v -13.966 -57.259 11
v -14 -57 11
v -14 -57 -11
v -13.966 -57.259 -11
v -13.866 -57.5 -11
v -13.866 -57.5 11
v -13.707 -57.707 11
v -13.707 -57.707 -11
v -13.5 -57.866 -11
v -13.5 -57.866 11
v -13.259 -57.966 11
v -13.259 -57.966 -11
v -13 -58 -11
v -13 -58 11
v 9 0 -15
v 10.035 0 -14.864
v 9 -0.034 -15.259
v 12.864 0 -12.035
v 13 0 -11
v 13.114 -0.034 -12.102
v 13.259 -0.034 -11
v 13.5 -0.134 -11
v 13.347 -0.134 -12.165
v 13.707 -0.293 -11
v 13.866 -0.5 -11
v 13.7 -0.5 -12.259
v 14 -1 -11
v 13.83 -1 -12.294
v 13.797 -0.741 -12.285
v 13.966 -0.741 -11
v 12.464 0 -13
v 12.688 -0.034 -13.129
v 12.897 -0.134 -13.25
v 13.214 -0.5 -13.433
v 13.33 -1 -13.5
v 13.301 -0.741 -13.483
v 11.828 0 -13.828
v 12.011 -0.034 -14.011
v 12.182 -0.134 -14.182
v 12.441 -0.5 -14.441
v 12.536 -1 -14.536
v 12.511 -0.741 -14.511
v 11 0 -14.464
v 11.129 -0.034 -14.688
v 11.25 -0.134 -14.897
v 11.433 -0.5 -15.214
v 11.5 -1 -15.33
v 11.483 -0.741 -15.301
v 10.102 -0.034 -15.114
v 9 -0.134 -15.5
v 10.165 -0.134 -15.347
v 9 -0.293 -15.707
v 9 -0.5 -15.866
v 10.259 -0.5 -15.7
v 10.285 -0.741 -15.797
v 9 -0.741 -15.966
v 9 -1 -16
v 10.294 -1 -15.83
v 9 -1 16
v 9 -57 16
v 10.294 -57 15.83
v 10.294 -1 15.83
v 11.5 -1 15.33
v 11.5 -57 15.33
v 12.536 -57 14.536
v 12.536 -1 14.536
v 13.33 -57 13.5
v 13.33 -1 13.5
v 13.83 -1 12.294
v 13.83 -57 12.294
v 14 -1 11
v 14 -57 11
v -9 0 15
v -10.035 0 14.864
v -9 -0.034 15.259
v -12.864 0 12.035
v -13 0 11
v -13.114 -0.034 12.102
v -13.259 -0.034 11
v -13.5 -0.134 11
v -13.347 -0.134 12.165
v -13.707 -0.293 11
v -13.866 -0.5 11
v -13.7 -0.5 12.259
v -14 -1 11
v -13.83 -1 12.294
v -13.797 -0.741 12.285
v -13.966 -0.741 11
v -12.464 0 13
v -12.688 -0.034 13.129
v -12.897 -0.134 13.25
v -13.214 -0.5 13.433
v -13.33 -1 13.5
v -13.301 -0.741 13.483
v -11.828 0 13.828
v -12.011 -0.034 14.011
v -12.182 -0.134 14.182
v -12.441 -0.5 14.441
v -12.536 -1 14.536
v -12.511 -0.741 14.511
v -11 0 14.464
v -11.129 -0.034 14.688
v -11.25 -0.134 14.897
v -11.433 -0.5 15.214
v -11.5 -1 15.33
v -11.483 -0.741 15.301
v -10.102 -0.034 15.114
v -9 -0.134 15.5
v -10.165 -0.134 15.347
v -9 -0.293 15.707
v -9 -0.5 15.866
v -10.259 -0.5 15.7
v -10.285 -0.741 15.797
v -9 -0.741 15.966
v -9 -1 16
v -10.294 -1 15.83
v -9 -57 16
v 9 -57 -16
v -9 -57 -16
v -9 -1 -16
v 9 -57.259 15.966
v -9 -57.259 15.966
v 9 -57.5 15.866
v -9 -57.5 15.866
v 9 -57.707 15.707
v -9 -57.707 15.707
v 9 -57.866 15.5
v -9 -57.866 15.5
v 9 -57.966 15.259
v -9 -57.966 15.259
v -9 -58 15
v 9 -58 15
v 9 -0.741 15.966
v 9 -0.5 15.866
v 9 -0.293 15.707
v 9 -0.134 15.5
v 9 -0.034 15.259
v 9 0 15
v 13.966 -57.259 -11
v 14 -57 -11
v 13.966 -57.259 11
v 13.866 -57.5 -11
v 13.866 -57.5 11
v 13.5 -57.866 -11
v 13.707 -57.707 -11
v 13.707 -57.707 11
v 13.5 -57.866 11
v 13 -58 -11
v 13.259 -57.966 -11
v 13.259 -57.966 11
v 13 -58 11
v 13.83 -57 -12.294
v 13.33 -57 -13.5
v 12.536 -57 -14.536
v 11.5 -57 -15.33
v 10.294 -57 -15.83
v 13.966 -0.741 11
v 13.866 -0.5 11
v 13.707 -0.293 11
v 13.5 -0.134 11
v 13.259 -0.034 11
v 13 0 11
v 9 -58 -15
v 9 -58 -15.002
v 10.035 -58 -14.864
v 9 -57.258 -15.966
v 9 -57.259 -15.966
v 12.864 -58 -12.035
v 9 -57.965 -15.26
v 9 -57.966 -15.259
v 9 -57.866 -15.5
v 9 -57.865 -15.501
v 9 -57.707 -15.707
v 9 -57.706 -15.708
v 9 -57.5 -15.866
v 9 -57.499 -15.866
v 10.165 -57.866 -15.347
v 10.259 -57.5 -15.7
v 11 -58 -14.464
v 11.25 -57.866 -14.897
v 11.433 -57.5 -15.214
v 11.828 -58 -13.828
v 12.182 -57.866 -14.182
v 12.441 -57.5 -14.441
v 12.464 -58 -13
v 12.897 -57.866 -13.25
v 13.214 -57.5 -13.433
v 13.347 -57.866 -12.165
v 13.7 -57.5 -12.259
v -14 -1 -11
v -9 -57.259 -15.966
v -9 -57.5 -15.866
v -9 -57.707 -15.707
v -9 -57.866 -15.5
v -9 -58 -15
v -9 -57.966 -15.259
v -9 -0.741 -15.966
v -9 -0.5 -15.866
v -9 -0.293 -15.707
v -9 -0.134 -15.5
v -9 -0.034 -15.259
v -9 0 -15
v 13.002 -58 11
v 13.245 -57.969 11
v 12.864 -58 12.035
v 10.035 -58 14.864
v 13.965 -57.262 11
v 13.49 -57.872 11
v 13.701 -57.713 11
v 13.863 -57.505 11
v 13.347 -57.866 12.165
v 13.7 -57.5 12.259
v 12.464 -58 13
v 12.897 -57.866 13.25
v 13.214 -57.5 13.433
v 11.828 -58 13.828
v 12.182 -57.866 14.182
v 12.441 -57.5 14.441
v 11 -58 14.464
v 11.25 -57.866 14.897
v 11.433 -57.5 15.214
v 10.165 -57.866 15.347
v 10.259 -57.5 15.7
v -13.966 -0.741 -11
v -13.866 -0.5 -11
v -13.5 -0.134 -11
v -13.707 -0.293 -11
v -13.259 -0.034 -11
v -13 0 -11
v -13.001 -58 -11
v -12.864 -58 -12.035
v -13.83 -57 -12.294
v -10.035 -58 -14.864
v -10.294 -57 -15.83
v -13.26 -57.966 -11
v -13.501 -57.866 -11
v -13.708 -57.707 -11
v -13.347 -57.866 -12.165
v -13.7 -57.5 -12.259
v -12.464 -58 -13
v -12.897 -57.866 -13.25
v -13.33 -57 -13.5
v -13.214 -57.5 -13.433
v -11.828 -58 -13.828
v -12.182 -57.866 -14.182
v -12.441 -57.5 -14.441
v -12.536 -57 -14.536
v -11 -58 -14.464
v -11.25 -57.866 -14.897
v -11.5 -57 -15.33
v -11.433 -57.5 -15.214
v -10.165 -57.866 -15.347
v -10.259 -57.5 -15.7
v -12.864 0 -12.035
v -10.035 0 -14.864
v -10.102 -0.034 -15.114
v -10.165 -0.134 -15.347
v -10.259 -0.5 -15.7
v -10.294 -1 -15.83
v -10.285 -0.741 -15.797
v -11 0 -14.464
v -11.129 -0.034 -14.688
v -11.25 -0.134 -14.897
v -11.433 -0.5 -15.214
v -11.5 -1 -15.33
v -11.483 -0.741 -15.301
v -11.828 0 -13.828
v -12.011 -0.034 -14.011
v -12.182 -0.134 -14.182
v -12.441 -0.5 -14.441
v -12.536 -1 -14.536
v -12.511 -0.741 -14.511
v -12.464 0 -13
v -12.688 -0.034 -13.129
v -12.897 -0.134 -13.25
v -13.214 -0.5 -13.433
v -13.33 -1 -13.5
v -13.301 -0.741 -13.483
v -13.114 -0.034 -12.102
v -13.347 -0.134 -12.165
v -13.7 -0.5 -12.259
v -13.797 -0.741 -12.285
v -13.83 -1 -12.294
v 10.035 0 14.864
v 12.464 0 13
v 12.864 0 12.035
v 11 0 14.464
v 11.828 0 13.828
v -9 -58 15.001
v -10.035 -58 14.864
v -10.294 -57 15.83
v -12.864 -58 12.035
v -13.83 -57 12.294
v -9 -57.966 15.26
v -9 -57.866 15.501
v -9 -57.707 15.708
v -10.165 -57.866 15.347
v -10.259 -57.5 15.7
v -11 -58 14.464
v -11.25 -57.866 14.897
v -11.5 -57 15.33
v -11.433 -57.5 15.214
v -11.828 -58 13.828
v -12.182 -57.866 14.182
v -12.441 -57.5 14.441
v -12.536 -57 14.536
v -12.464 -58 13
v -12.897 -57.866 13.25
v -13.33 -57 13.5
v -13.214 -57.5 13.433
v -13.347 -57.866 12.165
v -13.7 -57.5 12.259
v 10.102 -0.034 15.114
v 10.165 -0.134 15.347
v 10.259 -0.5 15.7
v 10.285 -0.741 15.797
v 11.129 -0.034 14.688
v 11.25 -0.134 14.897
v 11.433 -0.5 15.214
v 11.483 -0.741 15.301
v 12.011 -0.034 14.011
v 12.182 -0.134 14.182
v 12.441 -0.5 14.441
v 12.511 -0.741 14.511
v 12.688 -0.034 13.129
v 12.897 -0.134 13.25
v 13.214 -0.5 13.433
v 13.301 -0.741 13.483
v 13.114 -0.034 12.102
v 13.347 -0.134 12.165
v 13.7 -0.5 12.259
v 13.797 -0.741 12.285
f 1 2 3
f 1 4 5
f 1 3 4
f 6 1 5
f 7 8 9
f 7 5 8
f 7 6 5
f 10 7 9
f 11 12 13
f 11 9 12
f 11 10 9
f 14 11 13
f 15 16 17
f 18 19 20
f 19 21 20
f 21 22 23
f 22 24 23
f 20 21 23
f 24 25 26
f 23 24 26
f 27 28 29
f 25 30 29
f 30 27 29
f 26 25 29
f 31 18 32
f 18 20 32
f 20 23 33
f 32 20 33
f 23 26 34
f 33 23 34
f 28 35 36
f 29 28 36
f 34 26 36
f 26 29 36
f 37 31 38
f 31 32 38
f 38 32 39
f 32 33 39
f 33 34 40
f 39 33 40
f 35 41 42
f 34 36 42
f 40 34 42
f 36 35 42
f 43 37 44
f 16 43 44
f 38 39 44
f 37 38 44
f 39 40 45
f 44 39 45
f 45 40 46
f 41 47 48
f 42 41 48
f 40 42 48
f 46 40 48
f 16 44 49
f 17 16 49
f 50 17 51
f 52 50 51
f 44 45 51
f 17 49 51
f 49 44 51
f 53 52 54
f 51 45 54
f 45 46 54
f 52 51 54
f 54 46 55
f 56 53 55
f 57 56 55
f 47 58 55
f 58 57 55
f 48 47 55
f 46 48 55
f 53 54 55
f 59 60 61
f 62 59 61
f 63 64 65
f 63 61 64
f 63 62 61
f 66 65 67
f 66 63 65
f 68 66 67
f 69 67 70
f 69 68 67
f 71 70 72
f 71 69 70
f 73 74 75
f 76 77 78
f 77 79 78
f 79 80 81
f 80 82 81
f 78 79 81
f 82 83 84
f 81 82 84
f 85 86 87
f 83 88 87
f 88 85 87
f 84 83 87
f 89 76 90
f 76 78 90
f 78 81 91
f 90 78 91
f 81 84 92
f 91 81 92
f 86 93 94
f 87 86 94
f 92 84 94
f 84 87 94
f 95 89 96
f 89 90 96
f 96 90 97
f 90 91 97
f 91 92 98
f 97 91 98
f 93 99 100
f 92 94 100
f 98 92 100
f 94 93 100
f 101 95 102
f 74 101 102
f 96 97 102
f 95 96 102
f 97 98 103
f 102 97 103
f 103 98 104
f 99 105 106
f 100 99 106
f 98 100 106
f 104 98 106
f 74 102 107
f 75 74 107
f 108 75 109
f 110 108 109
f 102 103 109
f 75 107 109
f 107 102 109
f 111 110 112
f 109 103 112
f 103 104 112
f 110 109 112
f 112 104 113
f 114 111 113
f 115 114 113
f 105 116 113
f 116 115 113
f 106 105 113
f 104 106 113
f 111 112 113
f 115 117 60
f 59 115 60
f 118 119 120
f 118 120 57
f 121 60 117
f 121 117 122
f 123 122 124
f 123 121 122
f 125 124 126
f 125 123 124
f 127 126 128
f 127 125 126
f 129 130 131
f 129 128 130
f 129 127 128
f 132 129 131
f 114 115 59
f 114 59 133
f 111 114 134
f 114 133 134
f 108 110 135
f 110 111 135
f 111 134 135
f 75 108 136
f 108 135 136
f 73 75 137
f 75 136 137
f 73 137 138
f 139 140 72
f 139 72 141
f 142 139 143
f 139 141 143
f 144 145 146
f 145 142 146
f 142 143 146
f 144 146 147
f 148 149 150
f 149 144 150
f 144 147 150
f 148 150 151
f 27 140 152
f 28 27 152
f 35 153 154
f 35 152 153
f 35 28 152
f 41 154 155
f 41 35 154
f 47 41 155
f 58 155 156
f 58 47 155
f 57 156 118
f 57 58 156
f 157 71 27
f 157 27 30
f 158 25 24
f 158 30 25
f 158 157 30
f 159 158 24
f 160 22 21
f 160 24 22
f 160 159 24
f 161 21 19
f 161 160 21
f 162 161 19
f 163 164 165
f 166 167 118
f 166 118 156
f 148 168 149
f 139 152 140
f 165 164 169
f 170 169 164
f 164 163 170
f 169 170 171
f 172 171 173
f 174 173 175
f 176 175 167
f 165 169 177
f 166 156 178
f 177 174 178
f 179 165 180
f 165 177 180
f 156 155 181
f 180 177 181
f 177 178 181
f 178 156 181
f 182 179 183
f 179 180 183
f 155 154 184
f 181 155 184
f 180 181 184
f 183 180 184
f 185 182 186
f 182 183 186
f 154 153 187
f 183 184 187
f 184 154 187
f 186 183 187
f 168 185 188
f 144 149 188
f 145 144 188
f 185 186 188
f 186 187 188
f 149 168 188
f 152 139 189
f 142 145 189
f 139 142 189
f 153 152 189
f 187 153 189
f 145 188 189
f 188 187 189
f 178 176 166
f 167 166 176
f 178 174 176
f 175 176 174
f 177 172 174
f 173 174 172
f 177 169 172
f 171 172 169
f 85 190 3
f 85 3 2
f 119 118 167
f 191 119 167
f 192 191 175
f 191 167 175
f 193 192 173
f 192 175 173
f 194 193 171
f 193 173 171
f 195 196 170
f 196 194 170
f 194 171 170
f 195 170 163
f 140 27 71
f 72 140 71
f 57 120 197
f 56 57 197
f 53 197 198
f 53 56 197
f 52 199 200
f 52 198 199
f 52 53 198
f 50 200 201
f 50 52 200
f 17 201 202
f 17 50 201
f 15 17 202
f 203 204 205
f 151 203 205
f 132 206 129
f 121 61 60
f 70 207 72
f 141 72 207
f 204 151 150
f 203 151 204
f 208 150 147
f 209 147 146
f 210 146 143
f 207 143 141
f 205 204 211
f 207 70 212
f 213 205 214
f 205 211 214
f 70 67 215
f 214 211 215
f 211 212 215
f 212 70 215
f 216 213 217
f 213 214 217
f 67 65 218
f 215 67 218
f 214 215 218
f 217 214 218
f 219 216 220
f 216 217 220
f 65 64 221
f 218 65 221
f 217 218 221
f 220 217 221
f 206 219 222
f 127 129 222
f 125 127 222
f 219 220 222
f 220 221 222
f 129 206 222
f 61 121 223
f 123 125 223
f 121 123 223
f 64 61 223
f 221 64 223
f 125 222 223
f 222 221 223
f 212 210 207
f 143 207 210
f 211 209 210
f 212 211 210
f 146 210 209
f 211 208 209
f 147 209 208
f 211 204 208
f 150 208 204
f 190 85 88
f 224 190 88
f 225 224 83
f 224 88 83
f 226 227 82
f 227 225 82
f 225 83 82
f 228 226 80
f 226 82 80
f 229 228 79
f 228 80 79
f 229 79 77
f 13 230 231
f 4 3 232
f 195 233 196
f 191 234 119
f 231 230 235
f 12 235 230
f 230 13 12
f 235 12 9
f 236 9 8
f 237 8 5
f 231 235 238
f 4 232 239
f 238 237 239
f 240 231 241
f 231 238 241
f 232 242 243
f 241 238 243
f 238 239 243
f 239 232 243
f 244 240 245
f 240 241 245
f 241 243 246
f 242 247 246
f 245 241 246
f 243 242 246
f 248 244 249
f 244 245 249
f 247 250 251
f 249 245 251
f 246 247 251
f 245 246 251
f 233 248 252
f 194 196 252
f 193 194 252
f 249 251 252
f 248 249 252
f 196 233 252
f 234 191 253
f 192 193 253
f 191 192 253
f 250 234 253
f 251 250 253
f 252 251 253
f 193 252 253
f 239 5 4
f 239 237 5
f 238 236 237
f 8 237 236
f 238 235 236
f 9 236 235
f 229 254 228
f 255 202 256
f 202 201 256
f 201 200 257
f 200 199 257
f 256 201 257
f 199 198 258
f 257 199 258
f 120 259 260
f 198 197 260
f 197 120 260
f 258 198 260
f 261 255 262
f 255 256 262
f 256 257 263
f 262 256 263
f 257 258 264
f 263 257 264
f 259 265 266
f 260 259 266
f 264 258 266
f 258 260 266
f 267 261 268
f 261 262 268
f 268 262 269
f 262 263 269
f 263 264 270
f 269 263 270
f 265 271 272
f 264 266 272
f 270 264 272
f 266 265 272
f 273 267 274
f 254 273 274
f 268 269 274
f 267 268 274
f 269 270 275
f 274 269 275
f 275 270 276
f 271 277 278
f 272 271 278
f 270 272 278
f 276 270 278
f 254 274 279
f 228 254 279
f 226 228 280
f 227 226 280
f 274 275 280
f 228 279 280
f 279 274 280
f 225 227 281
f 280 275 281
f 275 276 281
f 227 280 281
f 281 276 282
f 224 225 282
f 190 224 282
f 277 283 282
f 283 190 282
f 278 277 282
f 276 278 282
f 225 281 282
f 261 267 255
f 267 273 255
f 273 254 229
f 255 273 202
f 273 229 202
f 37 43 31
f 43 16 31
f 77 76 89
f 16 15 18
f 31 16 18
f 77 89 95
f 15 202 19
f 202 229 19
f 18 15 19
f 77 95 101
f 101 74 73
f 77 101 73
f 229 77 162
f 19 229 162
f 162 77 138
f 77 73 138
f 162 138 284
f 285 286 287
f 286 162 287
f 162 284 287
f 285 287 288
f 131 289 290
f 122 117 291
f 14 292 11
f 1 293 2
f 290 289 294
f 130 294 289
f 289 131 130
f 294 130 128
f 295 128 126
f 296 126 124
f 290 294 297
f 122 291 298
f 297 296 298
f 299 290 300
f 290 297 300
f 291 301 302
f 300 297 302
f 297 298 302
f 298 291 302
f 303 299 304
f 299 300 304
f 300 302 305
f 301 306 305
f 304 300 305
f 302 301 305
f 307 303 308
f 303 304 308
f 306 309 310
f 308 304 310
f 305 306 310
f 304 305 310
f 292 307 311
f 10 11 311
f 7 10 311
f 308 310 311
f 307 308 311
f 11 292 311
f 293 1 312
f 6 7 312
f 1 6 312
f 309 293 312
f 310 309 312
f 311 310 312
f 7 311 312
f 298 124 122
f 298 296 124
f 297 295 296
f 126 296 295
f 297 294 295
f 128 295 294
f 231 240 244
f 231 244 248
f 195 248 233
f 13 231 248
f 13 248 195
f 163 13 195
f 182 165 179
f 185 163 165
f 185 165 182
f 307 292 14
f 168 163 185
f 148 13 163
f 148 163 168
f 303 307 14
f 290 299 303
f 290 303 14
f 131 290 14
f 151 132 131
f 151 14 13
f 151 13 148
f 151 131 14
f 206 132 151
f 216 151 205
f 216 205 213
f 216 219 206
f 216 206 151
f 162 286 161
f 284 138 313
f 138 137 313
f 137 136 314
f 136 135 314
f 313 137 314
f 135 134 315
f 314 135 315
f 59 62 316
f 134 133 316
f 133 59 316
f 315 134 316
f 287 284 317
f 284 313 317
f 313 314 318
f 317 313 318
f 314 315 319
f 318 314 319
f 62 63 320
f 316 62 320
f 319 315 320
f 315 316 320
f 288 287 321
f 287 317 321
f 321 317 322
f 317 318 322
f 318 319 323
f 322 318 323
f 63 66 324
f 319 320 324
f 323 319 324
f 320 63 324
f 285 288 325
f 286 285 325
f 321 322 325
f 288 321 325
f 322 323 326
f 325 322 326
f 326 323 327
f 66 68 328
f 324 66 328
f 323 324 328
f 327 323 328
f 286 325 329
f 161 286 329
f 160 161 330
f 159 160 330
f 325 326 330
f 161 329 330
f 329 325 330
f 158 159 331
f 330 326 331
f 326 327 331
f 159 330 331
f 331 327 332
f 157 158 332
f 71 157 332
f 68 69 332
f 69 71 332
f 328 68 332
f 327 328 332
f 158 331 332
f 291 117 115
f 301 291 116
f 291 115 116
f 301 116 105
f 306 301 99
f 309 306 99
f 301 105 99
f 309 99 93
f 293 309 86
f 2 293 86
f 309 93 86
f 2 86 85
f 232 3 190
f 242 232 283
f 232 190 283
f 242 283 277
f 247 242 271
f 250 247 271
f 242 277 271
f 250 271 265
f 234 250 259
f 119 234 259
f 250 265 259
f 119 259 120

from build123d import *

# Parameters (mm, degrees)
F0_W         = 28
F0_H         = 32
F1_DEPTH     = 58
F2_R         = 1
F3_T1_DEPTH  = 58
F3_T4_ANGLE  = 90
F3_T6_ANGLE  = 90
F3_T8_ANGLE  = 90
F3_T10_ANGLE = 90
F3_T12_ANGLE = 90
F3_T14_ANGLE = 90
F3_T16_ANGLE = 90
F3_T18_ANGLE = 90


# Not quite as in the source:
# - a fillet or chamfer that OpenCascade refuses, or shapes differently, is made with other operations: its cross-section is extruded or revolved along the edge and cut away or added


with BuildPart() as f1:
    # F0 (on Front) → F1 (new body)
    with BuildSketch(Plane.XZ):
        Rectangle(F0_W, F0_H)
    extrude(amount=F1_DEPTH)

    # F2
    f2_edges = [f1.edges().sort_by_distance(p)[0] for p in [
        (0, -58, 16),
        (14, -58, 0),
        (0, -58, -16),
        (-14, -58, 0),
        (14, 0, 0),
        (0, 0, 16),
        (0, 0, -16),
        (-14, 0, 0),
    ]]
    fillet(f2_edges, radius=F2_R)

    # F3: fillet of radius 5 on 4 edges, made by hand

    # F3_s2 → F3_t1 (cut)
    with BuildSketch(Plane.XZ):
        with BuildLine():
            ThreePointArc((9, 16), (12.5355339059, 14.5355339059), (14, 11))
            Line((14, 11), (14, 16))
            Line((14, 16), (9, 16))
        make_face()
        with BuildLine():
            ThreePointArc((-9, 16), (-12.5355339059, 14.5355339059), (-14, 11))
            Line((-14, 11), (-14, 16))
            Line((-14, 16), (-9, 16))
        make_face()
        with BuildLine():
            ThreePointArc((14, -11), (12.5355339059, -14.5355339059), (9, -16))
            Line((9, -16), (14, -16))
            Line((14, -16), (14, -11))
        make_face()
        with BuildLine():
            ThreePointArc((-14, -11), (-12.5355339059, -14.5355339059), (-9, -16))
            Line((-9, -16), (-14, -16))
            Line((-14, -16), (-14, -11))
        make_face()
    extrude(amount=F3_T1_DEPTH, mode=Mode.SUBTRACT)

    # F3_s3 → F3_t4 (revolve, cut)
    with BuildSketch(Plane.YZ.offset(-9)):
        with BuildLine():
            ThreePointArc((0, -15), (-0.2928932188, -15.7071067812), (-1, -16))
            Line((-1, -16), (0, -16))
            Line((0, -16), (0, -15))
        make_face()
    revolve(axis=Axis((-9, 0, -11), (0, 1, 0)), revolution_arc=F3_T4_ANGLE, mode=Mode.SUBTRACT)

    # F3_s5 → F3_t6 (revolve, cut)
    with BuildSketch(Plane.XY.offset(-11)):
        with BuildLine():
            ThreePointArc((-13, -58), (-13.7071067812, -57.7071067812), (-14, -57))
            Line((-14, -57), (-14, -58))
            Line((-14, -58), (-13, -58))
        make_face()
    revolve(axis=Axis((-9, -58, -11), (0, -1, 0)), revolution_arc=F3_T6_ANGLE, mode=Mode.SUBTRACT)

    # F3_s7 → F3_t8 (revolve, cut)
    with BuildSketch(Plane.XY.offset(-11)):
        with BuildLine():
            ThreePointArc((13, 0), (13.7071067812, -0.2928932188), (14, -1))
            Line((14, -1), (14, 0))
            Line((14, 0), (13, 0))
        make_face()
    revolve(axis=Axis((9, 0, -11), (0, 1, 0)), revolution_arc=F3_T8_ANGLE, mode=Mode.SUBTRACT)

    # F3_s9 → F3_t10 (revolve, cut)
    with BuildSketch(Plane.YZ.offset(9)):
        with BuildLine():
            ThreePointArc((-58, -15), (-57.7071067812, -15.7071067812), (-57, -16))
            Line((-57, -16), (-58, -16))
            Line((-58, -16), (-58, -15))
        make_face()
    revolve(axis=Axis((9, -58, -11), (0, -1, 0)), revolution_arc=F3_T10_ANGLE, mode=Mode.SUBTRACT)

    # F3_s11 → F3_t12 (revolve, cut)
    with BuildSketch(Plane.XY.offset(11)):
        with BuildLine():
            ThreePointArc((-13, 0), (-13.7071067812, -0.2928932188), (-14, -1))
            Line((-14, -1), (-14, 0))
            Line((-14, 0), (-13, 0))
        make_face()
    revolve(axis=Axis((-9, 0, 11), (0, 1, 0)), revolution_arc=F3_T12_ANGLE, mode=Mode.SUBTRACT)

    # F3_s13 → F3_t14 (revolve, cut)
    with BuildSketch(Plane.YZ.offset(-9)):
        with BuildLine():
            ThreePointArc((-58, 15), (-57.7071067812, 15.7071067812), (-57, 16))
            Line((-57, 16), (-58, 16))
            Line((-58, 16), (-58, 15))
        make_face()
    revolve(axis=Axis((-9, -58, 11), (0, -1, 0)), revolution_arc=F3_T14_ANGLE, mode=Mode.SUBTRACT)

    # F3_s15 → F3_t16 (revolve, cut)
    with BuildSketch(Plane.YZ.offset(9)):
        with BuildLine():
            ThreePointArc((0, 15), (-0.2928932188, 15.7071067812), (-1, 16))
            Line((-1, 16), (0, 16))
            Line((0, 16), (0, 15))
        make_face()
    revolve(axis=Axis((9, 0, 11), (0, 1, 0)), revolution_arc=F3_T16_ANGLE, mode=Mode.SUBTRACT)

    # F3_s17 → F3_t18 (revolve, cut)
    with BuildSketch(Plane.XY.offset(11)):
        with BuildLine():
            ThreePointArc((13, -58), (13.7071067812, -57.7071067812), (14, -57))
            Line((14, -57), (14, -58))
            Line((14, -58), (13, -58))
        make_face()
    revolve(axis=Axis((9, -58, 11), (0, -1, 0)), revolution_arc=F3_T18_ANGLE, mode=Mode.SUBTRACT)


solid = f1.part
